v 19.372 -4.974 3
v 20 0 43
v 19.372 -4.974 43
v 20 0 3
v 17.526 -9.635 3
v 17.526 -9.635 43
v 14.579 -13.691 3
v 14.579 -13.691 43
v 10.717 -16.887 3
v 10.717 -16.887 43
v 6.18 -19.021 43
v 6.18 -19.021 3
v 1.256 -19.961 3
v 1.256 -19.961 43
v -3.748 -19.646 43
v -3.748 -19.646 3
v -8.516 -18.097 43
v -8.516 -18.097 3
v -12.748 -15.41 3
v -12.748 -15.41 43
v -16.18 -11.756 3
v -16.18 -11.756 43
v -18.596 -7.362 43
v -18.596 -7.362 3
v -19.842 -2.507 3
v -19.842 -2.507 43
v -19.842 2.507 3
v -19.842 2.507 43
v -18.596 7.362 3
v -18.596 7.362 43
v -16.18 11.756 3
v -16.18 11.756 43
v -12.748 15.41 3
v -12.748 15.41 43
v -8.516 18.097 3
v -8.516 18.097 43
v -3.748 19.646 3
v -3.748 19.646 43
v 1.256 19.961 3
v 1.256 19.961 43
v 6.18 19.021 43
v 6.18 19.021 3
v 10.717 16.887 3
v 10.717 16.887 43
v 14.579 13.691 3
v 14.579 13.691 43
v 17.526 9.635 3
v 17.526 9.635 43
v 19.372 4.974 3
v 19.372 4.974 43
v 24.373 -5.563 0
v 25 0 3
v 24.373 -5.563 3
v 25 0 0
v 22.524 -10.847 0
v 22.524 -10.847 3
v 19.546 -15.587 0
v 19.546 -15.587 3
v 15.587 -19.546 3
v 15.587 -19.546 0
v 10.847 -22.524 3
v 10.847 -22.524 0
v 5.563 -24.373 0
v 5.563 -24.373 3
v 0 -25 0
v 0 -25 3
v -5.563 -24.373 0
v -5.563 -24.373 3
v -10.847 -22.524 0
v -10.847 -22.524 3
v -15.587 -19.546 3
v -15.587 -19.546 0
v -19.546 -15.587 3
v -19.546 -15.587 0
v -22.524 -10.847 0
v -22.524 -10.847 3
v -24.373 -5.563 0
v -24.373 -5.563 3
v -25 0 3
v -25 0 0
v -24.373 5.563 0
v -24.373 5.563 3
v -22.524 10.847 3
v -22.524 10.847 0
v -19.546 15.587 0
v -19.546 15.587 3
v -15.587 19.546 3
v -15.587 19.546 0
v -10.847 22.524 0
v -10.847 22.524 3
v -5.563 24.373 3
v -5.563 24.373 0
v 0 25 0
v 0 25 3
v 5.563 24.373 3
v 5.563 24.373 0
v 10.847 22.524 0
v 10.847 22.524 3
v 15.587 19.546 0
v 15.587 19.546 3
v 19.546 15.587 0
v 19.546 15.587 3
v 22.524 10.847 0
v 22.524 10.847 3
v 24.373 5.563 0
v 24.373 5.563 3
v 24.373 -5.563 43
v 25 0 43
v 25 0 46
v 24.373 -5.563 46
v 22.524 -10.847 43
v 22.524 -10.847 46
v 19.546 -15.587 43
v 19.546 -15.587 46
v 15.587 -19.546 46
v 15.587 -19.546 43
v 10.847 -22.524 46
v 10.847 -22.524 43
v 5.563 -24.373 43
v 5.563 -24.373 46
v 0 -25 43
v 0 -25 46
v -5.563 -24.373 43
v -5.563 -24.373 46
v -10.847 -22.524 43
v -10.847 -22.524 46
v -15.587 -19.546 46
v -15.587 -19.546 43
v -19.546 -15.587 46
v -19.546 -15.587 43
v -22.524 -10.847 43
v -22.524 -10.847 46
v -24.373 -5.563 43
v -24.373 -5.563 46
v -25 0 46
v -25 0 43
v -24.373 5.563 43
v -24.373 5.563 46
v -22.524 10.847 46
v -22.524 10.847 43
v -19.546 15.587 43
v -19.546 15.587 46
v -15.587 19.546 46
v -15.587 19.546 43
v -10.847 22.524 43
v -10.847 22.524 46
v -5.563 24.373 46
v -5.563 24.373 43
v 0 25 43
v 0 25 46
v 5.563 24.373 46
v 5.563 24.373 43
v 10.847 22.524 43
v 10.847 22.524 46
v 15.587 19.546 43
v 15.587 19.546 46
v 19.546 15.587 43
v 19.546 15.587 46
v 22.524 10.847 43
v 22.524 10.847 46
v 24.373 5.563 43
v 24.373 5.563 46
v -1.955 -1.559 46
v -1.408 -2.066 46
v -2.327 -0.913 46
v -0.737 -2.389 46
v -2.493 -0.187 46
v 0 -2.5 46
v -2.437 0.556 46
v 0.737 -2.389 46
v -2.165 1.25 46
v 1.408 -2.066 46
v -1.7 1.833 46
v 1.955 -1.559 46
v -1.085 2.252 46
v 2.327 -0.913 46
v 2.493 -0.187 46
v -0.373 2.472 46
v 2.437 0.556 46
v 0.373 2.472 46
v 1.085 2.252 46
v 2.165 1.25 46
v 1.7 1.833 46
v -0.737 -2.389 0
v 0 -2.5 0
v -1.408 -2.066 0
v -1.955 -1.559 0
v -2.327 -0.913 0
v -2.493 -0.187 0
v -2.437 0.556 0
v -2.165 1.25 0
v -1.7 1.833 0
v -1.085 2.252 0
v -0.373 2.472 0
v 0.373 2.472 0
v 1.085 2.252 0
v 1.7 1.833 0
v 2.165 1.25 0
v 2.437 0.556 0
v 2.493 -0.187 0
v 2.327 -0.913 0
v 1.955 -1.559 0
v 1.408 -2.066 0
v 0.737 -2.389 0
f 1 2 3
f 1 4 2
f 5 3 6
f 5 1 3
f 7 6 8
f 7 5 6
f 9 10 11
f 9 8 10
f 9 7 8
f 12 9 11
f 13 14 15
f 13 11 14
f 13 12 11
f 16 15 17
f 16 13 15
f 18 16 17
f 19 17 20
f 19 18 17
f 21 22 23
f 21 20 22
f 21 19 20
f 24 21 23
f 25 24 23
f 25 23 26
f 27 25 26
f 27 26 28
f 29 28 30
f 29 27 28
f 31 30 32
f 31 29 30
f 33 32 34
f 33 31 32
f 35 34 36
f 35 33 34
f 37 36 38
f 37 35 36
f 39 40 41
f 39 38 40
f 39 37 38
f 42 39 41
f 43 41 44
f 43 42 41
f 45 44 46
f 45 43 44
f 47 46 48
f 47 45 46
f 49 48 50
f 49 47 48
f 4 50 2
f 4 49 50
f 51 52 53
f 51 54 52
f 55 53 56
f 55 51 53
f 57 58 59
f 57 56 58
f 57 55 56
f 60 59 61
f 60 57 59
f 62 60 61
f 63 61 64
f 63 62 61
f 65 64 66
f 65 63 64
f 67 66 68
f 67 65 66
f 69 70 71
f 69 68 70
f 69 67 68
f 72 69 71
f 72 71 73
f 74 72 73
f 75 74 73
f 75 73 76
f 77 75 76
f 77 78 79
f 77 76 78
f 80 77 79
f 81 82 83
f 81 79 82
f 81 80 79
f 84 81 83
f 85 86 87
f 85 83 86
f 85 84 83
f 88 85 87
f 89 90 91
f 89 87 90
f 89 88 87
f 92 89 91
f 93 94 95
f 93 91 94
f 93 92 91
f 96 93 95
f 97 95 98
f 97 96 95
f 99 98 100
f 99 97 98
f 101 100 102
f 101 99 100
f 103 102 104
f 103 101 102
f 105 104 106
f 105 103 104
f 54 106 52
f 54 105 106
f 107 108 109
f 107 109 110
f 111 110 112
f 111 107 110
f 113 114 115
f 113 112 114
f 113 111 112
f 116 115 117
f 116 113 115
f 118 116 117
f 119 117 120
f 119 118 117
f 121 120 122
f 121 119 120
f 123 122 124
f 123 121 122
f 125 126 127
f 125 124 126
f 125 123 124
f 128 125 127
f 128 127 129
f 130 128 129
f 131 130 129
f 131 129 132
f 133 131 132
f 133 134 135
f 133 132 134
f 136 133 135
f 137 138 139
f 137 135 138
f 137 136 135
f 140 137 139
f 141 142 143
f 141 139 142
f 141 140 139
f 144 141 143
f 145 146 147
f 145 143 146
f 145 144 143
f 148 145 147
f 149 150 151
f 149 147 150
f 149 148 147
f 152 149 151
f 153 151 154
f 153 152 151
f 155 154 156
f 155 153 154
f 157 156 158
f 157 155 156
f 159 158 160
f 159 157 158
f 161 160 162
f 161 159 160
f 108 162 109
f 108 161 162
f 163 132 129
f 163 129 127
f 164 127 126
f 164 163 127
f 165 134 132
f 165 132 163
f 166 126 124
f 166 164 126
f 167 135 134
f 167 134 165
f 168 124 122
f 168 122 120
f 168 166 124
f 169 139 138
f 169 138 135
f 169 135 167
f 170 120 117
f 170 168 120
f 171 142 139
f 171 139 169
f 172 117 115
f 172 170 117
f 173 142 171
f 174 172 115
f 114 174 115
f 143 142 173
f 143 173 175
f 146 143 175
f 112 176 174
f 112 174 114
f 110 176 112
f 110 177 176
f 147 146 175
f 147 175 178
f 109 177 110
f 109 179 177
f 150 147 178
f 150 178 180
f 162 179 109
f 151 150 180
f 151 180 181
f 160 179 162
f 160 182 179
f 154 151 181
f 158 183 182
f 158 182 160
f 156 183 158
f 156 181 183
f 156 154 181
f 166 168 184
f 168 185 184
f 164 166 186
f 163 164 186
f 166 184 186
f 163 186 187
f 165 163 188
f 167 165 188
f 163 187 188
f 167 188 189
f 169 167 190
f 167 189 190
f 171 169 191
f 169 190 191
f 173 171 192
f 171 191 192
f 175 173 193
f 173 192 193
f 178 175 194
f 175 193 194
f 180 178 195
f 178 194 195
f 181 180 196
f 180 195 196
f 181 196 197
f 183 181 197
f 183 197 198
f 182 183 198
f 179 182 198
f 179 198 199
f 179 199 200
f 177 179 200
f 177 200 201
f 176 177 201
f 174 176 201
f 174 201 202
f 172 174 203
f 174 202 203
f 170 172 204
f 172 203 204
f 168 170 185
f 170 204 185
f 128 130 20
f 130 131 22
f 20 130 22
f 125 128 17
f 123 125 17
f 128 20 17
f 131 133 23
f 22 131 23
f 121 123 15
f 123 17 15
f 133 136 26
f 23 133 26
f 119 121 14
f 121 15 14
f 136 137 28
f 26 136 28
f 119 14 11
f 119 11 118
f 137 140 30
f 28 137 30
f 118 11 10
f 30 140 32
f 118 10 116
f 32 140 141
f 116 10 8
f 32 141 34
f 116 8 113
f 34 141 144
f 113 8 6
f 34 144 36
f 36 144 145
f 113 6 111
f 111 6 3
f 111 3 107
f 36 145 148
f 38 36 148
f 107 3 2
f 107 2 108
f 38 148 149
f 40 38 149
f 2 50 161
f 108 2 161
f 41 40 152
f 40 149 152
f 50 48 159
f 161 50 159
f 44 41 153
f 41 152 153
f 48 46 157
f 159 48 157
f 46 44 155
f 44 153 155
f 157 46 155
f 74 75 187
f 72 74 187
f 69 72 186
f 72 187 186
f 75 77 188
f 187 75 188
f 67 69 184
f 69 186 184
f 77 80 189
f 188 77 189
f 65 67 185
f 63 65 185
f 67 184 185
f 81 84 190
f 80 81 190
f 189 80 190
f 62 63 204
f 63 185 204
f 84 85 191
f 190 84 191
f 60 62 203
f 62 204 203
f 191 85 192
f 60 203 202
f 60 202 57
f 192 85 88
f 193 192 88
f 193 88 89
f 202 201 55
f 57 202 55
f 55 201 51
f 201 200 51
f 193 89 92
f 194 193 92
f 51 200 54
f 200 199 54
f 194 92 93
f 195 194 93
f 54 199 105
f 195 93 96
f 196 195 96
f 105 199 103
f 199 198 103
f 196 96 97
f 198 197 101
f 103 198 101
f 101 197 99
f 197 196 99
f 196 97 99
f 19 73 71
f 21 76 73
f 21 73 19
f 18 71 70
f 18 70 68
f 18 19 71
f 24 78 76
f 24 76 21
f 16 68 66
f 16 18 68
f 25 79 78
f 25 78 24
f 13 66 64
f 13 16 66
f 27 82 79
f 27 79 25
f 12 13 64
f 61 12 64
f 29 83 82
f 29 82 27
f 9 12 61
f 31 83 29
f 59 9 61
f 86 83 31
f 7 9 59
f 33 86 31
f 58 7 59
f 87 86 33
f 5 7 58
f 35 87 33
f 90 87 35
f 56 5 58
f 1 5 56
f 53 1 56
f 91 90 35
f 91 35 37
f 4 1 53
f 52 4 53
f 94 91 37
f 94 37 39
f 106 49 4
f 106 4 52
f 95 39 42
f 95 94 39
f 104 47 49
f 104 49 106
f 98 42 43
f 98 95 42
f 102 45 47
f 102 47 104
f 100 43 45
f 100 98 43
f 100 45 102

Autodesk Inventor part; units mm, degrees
ref_plane "YZ Plane" through (0, 0, 0) normal (1, 0, 0) x (0, 1, 0)
ref_plane "XZ Plane" through (0, 0, 0) normal (0, 1, 0) x (-1, 0, 0)
ref_plane "XY Plane" through (0, 0, 0) normal (0, 0, 1) x (1, 0, 0)
sketch "スケッチ1" plane through (0, 0, 0) normal (0, 0, 1) x (1, 0, 0)
  circle A0 centre (0, 0) radius 25
  dimension "d0" = 50
extrude "押し出し1" add sketch "スケッチ1" along normal blind 3
sketch "スケッチ2" plane through (0, 0, 3) normal (0, 0, 1) x (1, 0, 0)
  circle A0 centre (0, 0) radius 20
  dimension "d3" = 40
extrude "押し出し2" add sketch "スケッチ2" along normal blind 40
sketch "スケッチ3" plane through (0, 0, 43) normal (0, 0, 1) x (1, 0, 0)
  circle A0 centre (0, 0) radius 25
  dimension "d6" = 50
extrude "押し出し3" add sketch "スケッチ3" along normal blind 3
sketch "スケッチ4" plane through (0, 0, 46) normal (0, 0, 1) x (1, 0, 0)
  circle A0 centre (0, 0) radius 2.5
  dimension "d9" = 5
hole "穴1" at (0, 0, 46) direction (0, 0, -1) diameter 5 depth 46
equation "\"BendRadius\" = Thickness"
equation "\"BendReliefWidth\" = Thickness"
equation "\"BendReliefDepth\" = 0.5 * Thickness"
equation "\"CornerReliefSize\" = 4 * Thickness"
equation "\"MinimumRemnant\" = 2 * Thickness"
equation "\"TransitionRadius\" = BendRadius"
equation "\"JacobiRadiusSize\" = BendRadius"
equation "\"GapSize\" = Thickness"
equation "\"Thickness\" = 0.5"
properties part number "nhk10"
